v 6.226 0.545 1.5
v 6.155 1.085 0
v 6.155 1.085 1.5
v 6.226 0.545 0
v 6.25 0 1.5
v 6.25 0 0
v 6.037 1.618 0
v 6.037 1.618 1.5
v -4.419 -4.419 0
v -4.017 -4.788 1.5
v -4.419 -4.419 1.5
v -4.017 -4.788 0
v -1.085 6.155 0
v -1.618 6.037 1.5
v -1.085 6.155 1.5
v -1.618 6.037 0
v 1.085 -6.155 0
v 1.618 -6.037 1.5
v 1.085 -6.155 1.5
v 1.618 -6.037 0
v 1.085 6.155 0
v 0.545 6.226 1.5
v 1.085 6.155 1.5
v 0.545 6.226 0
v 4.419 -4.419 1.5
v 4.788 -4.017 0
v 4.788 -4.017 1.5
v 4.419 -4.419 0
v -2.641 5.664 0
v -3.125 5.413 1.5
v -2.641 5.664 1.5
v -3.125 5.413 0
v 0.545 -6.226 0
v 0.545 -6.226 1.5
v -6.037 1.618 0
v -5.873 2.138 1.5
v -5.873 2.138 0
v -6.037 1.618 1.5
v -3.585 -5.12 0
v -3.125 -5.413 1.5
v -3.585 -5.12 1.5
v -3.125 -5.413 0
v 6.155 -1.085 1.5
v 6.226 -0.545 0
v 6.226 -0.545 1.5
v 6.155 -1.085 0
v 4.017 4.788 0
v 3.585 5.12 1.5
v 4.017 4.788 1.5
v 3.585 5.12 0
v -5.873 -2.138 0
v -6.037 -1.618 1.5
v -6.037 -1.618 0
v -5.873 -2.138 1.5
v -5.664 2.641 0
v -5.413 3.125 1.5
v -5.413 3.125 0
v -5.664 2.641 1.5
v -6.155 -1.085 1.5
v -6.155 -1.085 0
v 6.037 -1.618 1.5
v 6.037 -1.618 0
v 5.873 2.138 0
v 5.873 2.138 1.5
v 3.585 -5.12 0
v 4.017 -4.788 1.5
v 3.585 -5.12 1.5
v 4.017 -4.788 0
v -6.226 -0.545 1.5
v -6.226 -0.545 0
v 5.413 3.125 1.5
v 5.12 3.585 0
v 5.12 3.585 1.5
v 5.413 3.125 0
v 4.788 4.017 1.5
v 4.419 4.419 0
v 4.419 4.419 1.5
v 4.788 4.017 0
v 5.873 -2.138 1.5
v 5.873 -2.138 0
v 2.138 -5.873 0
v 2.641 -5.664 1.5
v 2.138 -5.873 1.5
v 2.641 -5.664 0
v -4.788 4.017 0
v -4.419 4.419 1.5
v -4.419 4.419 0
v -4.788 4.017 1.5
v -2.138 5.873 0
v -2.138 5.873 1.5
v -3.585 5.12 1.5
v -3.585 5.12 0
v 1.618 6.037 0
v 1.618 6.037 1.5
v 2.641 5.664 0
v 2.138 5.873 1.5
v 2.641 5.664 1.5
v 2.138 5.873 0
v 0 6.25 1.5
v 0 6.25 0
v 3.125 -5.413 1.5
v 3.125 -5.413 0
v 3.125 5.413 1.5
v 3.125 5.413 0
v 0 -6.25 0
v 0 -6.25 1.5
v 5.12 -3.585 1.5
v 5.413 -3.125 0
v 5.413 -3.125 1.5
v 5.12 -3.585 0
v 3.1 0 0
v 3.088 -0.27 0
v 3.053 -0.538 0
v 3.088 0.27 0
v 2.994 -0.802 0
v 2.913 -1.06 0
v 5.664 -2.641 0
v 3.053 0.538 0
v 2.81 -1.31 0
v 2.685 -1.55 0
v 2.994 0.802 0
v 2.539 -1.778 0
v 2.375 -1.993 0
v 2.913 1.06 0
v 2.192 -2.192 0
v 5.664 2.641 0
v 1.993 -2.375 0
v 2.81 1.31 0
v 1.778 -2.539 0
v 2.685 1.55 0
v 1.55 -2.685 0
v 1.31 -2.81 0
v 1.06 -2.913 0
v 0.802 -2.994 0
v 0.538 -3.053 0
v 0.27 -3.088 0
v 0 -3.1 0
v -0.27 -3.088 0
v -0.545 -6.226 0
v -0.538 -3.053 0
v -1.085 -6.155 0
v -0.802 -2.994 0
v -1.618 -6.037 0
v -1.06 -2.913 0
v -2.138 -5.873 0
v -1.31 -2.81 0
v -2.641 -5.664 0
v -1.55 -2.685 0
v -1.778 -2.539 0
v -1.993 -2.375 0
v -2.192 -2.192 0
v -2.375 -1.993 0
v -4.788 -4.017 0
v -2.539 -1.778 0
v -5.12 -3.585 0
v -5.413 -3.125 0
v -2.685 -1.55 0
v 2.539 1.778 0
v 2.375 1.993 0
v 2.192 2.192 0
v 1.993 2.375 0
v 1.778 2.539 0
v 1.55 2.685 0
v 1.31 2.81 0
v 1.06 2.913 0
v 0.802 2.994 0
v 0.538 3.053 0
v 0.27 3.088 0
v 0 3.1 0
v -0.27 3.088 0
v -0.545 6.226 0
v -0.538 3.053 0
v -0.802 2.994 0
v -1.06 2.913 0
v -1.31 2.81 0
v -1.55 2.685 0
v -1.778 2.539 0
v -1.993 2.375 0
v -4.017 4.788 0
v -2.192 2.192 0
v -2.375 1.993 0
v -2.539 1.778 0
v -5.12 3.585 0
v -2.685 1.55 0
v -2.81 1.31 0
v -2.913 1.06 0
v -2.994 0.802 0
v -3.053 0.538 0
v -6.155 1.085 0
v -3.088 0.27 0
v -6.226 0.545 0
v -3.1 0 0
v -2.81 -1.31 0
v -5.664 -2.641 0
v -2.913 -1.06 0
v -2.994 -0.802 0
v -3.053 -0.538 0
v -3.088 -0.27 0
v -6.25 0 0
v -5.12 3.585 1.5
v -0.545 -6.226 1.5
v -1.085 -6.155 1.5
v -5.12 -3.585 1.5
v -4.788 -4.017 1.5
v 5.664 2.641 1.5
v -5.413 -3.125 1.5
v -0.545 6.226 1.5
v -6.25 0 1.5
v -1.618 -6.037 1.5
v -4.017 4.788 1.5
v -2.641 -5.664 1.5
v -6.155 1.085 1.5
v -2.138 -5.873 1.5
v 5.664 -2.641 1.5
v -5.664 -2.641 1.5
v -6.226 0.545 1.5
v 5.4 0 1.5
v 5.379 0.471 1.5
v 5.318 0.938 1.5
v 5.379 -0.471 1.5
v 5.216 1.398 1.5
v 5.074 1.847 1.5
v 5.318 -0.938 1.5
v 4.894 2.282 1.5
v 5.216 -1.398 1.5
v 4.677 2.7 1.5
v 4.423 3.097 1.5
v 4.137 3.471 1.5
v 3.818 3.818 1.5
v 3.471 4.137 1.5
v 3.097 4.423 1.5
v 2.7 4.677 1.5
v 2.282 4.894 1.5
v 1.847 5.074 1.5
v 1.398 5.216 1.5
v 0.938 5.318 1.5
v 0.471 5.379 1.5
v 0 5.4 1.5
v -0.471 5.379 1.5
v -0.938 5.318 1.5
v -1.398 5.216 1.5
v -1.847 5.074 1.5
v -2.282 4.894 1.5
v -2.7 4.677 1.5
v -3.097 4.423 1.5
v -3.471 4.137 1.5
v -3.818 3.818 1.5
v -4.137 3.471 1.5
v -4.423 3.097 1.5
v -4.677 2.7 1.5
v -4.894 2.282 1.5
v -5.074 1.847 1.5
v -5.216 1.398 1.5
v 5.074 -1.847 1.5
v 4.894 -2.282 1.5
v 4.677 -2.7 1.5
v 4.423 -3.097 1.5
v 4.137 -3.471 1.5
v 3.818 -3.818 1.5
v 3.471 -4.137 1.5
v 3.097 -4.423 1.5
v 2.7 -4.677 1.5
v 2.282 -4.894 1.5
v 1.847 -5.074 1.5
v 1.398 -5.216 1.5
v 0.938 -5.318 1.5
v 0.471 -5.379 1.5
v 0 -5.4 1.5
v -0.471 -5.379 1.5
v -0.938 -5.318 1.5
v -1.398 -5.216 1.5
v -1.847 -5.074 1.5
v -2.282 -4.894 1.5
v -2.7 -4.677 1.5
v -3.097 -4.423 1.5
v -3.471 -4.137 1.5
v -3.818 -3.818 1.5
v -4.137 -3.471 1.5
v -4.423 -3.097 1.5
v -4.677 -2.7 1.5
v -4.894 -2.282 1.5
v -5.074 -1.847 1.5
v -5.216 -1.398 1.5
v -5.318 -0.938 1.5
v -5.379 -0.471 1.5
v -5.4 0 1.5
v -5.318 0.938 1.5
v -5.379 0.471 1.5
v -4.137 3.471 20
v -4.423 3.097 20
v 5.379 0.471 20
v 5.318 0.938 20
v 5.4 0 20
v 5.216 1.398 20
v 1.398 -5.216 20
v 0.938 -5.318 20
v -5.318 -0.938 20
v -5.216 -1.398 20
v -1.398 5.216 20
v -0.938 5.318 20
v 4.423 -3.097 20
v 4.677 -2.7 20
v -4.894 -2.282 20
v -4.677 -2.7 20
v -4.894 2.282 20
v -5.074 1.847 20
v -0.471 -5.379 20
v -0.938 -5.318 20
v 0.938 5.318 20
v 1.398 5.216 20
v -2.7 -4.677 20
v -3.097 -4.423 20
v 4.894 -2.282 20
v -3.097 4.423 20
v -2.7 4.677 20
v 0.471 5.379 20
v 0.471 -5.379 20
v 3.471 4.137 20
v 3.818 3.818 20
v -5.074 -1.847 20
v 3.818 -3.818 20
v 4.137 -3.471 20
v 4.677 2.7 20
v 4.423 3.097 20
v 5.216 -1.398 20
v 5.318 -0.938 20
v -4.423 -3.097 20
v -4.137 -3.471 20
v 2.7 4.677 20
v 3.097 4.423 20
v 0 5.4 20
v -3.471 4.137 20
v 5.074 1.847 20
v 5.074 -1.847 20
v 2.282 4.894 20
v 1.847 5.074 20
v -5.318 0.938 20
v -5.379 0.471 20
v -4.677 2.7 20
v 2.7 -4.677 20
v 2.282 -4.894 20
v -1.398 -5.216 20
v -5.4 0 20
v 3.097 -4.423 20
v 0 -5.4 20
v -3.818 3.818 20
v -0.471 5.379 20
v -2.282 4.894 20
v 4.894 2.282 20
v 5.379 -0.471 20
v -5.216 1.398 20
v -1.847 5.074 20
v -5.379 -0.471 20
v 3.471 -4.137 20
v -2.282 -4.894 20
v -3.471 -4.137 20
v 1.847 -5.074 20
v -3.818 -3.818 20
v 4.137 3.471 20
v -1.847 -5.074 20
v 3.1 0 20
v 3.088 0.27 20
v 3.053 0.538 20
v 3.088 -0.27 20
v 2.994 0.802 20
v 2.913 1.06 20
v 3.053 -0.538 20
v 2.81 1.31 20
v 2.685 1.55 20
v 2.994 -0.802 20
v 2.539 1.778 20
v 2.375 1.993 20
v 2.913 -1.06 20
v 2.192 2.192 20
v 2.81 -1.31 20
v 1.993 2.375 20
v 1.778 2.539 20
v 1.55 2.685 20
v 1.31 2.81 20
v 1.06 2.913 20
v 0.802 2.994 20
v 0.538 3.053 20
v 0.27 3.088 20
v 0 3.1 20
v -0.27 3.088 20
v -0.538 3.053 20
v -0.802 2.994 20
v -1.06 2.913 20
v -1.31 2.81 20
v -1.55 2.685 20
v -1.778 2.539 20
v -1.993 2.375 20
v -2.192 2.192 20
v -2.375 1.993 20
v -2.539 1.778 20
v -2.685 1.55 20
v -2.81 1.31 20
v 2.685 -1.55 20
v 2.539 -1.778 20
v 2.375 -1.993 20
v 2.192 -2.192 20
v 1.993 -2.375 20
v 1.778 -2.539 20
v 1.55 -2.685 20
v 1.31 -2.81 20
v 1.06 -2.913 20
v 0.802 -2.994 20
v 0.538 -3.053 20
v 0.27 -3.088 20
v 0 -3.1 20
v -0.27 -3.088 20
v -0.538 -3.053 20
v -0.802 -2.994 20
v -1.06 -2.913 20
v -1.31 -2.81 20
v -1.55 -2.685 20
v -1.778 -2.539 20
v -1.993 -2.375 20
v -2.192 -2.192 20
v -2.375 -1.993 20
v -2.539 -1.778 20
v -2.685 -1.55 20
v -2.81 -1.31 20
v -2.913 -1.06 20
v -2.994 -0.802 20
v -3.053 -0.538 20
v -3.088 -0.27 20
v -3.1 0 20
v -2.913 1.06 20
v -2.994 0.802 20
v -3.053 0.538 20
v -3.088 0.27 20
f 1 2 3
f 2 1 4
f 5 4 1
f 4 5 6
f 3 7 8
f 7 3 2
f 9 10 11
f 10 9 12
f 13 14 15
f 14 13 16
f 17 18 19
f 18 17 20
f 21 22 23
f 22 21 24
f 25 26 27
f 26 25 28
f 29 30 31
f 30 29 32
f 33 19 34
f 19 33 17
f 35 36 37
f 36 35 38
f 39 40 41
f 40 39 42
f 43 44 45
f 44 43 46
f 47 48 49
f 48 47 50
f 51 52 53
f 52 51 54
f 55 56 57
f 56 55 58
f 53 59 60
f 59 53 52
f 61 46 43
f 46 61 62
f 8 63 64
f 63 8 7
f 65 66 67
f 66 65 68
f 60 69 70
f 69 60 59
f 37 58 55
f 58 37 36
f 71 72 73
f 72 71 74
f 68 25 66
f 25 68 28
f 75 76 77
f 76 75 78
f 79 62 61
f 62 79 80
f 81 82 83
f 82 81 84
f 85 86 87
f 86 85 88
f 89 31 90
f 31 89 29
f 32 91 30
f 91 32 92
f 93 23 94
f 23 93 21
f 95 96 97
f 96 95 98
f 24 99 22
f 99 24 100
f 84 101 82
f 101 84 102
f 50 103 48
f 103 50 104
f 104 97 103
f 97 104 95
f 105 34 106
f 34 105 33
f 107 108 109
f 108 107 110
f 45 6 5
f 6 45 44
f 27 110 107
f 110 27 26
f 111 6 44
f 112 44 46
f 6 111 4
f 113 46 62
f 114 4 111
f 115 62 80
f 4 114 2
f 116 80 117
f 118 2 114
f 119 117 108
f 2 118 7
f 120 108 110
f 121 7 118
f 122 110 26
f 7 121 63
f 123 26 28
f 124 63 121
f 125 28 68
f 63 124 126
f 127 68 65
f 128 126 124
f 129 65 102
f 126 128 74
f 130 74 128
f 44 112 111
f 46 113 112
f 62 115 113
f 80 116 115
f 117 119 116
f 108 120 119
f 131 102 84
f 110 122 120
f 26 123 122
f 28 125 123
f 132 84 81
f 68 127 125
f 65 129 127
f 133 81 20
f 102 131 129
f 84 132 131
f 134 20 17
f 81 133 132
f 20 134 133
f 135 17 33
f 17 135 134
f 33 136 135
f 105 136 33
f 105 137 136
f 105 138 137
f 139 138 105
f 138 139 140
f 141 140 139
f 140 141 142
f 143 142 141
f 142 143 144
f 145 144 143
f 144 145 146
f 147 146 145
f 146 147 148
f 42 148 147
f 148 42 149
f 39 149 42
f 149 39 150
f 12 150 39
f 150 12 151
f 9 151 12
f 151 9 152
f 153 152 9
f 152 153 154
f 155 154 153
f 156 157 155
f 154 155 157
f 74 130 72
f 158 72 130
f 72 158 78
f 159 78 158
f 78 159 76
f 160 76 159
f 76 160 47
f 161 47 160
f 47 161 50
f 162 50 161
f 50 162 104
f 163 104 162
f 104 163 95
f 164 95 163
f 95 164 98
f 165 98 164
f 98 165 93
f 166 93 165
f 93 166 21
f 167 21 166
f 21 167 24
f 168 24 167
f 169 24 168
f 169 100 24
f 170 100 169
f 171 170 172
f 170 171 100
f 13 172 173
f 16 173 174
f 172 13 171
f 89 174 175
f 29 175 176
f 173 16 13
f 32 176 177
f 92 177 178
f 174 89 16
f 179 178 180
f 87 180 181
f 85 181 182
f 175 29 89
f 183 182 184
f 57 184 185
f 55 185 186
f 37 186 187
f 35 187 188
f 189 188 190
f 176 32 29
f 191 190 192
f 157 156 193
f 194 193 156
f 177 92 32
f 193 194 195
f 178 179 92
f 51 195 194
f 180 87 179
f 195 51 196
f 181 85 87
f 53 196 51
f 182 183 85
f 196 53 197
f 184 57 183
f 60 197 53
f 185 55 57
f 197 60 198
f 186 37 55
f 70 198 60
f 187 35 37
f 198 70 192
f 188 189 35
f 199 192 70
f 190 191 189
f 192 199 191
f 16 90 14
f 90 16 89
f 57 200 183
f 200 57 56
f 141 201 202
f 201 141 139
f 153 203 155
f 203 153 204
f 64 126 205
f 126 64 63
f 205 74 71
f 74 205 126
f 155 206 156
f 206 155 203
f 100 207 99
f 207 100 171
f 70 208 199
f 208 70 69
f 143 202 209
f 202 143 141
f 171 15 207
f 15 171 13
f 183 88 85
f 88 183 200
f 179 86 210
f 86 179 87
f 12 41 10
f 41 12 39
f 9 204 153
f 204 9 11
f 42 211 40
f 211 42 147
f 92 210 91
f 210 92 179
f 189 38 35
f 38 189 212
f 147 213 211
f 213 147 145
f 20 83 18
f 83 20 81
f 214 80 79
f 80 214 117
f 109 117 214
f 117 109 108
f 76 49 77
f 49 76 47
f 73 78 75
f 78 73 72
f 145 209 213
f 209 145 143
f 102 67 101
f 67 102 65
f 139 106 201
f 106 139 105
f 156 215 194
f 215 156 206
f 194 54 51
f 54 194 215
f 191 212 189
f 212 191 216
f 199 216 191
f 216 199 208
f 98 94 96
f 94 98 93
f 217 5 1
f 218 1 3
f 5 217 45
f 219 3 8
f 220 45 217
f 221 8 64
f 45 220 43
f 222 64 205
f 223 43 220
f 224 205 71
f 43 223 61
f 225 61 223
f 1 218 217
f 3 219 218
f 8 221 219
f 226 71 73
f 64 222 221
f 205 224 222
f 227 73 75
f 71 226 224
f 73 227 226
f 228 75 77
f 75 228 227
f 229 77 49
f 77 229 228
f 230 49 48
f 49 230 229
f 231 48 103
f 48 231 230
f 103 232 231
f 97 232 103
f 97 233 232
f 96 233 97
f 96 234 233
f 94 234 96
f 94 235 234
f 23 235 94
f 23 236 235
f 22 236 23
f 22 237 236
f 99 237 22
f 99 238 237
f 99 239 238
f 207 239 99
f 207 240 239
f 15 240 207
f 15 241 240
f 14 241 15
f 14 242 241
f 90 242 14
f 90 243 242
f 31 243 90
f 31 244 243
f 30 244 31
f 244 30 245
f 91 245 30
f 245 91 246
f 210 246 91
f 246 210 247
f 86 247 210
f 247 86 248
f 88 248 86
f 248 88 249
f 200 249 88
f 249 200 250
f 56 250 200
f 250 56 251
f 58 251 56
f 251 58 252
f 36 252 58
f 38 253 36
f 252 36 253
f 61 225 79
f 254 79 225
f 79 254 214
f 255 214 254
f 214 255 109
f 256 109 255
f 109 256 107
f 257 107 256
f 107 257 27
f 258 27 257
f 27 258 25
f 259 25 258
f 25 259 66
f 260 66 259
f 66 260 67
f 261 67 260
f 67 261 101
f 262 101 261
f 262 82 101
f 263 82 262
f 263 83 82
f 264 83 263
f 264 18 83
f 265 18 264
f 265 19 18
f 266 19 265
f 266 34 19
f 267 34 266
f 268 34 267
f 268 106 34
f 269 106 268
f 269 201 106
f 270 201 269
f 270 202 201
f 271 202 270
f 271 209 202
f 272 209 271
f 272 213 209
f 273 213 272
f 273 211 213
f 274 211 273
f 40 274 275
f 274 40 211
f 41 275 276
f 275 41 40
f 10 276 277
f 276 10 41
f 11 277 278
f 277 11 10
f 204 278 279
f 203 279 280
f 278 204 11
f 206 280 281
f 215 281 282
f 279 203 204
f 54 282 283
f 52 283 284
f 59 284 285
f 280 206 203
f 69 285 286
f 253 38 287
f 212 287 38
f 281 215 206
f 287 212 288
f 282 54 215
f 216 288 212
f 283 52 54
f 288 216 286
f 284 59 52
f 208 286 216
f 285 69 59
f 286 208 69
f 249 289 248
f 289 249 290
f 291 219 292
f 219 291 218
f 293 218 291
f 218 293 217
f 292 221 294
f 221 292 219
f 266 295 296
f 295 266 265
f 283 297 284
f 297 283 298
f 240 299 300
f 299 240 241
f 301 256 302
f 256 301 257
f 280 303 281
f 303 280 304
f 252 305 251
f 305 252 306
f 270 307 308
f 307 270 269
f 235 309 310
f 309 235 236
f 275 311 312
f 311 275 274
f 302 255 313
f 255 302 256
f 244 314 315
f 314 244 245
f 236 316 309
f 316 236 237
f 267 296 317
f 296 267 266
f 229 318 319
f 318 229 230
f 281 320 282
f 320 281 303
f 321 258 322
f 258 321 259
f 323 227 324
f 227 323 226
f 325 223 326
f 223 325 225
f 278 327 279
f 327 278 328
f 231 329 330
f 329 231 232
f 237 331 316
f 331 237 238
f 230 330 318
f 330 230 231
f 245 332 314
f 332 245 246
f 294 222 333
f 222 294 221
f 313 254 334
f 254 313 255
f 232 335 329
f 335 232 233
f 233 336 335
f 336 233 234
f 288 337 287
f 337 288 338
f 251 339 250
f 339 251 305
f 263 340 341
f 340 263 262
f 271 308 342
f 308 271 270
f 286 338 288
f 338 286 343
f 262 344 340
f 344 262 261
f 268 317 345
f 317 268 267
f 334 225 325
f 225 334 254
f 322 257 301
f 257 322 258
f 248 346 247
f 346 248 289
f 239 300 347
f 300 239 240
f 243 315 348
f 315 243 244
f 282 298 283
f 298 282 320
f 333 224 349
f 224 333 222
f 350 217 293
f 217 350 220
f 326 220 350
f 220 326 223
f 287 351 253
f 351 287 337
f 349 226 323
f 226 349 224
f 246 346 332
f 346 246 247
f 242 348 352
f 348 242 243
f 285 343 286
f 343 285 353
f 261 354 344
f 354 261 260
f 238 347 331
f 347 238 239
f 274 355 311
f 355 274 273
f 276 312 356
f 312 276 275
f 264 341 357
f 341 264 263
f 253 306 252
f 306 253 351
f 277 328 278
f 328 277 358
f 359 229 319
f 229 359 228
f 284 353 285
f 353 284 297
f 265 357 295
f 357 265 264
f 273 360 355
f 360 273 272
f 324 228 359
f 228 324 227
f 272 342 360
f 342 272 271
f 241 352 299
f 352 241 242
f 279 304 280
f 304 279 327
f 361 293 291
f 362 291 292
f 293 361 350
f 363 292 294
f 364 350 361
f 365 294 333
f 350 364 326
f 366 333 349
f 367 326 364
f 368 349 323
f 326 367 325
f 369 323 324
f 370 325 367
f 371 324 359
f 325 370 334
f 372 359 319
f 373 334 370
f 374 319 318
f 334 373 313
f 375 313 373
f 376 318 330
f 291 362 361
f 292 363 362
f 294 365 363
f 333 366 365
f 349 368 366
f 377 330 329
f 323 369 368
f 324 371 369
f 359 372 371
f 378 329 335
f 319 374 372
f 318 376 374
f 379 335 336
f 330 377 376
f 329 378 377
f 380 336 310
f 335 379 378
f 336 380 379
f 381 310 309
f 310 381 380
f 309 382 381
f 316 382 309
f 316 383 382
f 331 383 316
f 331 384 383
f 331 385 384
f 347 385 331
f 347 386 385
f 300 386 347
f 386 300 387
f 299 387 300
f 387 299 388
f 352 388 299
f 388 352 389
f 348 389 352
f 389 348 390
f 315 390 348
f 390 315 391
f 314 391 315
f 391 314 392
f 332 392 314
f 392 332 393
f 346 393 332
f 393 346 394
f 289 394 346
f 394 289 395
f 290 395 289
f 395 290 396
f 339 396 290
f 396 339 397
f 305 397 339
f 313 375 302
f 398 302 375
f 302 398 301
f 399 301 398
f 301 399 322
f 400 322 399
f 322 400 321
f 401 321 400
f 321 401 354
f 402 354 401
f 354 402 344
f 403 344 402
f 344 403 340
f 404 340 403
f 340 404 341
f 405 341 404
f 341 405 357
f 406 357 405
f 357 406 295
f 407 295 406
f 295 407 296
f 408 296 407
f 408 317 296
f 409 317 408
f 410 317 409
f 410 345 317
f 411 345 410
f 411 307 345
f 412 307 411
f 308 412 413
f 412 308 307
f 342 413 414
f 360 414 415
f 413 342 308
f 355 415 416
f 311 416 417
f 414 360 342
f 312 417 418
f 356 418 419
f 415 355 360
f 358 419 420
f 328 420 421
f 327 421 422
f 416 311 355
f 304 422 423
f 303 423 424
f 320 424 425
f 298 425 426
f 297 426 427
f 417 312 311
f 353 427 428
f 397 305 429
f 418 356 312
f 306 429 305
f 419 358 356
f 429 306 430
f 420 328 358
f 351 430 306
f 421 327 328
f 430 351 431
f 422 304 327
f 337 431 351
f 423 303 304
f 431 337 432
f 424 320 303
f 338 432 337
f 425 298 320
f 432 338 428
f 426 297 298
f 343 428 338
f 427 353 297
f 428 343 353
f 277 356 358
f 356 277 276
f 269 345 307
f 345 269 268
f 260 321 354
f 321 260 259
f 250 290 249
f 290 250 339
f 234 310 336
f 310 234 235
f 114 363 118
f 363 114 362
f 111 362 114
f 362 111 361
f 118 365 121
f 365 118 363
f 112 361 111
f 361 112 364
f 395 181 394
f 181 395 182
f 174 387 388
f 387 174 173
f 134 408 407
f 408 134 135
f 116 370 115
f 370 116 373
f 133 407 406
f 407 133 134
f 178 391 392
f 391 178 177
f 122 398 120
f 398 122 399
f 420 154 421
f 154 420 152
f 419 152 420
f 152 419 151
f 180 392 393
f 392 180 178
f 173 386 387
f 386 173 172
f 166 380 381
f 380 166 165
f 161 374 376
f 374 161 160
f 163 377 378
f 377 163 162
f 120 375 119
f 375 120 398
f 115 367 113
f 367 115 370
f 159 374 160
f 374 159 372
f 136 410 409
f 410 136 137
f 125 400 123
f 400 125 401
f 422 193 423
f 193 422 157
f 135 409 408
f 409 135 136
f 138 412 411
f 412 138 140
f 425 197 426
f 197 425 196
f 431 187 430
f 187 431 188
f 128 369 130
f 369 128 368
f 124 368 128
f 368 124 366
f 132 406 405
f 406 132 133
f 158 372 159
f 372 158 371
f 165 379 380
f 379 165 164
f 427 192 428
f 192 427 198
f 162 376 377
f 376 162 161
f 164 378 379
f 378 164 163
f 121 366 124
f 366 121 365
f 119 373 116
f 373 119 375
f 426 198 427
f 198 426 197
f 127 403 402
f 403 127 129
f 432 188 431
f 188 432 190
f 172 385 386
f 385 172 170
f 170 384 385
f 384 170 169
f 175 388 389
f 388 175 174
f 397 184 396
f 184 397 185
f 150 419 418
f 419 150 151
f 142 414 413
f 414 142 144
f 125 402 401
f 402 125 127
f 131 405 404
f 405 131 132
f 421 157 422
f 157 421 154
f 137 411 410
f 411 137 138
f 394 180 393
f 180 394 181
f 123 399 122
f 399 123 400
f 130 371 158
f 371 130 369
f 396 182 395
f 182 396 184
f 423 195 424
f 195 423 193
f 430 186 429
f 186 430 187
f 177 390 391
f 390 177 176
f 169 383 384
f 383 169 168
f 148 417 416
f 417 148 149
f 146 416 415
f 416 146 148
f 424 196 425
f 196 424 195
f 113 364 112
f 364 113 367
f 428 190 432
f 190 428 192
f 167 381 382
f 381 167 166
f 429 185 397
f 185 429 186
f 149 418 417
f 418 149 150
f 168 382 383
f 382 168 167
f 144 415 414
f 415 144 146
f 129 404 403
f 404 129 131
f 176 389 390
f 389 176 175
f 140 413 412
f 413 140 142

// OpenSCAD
// Adapter sleeve - a collar with a sleeve body that lines a 1.5 mL rack hole to hold a 0.2 mL
// PCR tube, with a through bore. NOVEL general part (a generic tube adapter).
//

top_d     = 13;
body_d    = 10.8;
collar_t  = 1.5;
body_h    = 21.5 - 1.5;
bore_d    = 6.2;

$fn = 72;

collar_d = top_d - 0.5;   // 0.25 mm clearance so a tube end does not bind at the top

difference() {
    union() {
        cylinder(h = collar_t, d = collar_d);                 // collar on the bed
        cylinder(h = body_h, d = body_d);                     // sleeve body above
    }
    translate([0, 0, -1]) cylinder(h = collar_t + body_h + 2, d = bore_d);   // through bore
}
